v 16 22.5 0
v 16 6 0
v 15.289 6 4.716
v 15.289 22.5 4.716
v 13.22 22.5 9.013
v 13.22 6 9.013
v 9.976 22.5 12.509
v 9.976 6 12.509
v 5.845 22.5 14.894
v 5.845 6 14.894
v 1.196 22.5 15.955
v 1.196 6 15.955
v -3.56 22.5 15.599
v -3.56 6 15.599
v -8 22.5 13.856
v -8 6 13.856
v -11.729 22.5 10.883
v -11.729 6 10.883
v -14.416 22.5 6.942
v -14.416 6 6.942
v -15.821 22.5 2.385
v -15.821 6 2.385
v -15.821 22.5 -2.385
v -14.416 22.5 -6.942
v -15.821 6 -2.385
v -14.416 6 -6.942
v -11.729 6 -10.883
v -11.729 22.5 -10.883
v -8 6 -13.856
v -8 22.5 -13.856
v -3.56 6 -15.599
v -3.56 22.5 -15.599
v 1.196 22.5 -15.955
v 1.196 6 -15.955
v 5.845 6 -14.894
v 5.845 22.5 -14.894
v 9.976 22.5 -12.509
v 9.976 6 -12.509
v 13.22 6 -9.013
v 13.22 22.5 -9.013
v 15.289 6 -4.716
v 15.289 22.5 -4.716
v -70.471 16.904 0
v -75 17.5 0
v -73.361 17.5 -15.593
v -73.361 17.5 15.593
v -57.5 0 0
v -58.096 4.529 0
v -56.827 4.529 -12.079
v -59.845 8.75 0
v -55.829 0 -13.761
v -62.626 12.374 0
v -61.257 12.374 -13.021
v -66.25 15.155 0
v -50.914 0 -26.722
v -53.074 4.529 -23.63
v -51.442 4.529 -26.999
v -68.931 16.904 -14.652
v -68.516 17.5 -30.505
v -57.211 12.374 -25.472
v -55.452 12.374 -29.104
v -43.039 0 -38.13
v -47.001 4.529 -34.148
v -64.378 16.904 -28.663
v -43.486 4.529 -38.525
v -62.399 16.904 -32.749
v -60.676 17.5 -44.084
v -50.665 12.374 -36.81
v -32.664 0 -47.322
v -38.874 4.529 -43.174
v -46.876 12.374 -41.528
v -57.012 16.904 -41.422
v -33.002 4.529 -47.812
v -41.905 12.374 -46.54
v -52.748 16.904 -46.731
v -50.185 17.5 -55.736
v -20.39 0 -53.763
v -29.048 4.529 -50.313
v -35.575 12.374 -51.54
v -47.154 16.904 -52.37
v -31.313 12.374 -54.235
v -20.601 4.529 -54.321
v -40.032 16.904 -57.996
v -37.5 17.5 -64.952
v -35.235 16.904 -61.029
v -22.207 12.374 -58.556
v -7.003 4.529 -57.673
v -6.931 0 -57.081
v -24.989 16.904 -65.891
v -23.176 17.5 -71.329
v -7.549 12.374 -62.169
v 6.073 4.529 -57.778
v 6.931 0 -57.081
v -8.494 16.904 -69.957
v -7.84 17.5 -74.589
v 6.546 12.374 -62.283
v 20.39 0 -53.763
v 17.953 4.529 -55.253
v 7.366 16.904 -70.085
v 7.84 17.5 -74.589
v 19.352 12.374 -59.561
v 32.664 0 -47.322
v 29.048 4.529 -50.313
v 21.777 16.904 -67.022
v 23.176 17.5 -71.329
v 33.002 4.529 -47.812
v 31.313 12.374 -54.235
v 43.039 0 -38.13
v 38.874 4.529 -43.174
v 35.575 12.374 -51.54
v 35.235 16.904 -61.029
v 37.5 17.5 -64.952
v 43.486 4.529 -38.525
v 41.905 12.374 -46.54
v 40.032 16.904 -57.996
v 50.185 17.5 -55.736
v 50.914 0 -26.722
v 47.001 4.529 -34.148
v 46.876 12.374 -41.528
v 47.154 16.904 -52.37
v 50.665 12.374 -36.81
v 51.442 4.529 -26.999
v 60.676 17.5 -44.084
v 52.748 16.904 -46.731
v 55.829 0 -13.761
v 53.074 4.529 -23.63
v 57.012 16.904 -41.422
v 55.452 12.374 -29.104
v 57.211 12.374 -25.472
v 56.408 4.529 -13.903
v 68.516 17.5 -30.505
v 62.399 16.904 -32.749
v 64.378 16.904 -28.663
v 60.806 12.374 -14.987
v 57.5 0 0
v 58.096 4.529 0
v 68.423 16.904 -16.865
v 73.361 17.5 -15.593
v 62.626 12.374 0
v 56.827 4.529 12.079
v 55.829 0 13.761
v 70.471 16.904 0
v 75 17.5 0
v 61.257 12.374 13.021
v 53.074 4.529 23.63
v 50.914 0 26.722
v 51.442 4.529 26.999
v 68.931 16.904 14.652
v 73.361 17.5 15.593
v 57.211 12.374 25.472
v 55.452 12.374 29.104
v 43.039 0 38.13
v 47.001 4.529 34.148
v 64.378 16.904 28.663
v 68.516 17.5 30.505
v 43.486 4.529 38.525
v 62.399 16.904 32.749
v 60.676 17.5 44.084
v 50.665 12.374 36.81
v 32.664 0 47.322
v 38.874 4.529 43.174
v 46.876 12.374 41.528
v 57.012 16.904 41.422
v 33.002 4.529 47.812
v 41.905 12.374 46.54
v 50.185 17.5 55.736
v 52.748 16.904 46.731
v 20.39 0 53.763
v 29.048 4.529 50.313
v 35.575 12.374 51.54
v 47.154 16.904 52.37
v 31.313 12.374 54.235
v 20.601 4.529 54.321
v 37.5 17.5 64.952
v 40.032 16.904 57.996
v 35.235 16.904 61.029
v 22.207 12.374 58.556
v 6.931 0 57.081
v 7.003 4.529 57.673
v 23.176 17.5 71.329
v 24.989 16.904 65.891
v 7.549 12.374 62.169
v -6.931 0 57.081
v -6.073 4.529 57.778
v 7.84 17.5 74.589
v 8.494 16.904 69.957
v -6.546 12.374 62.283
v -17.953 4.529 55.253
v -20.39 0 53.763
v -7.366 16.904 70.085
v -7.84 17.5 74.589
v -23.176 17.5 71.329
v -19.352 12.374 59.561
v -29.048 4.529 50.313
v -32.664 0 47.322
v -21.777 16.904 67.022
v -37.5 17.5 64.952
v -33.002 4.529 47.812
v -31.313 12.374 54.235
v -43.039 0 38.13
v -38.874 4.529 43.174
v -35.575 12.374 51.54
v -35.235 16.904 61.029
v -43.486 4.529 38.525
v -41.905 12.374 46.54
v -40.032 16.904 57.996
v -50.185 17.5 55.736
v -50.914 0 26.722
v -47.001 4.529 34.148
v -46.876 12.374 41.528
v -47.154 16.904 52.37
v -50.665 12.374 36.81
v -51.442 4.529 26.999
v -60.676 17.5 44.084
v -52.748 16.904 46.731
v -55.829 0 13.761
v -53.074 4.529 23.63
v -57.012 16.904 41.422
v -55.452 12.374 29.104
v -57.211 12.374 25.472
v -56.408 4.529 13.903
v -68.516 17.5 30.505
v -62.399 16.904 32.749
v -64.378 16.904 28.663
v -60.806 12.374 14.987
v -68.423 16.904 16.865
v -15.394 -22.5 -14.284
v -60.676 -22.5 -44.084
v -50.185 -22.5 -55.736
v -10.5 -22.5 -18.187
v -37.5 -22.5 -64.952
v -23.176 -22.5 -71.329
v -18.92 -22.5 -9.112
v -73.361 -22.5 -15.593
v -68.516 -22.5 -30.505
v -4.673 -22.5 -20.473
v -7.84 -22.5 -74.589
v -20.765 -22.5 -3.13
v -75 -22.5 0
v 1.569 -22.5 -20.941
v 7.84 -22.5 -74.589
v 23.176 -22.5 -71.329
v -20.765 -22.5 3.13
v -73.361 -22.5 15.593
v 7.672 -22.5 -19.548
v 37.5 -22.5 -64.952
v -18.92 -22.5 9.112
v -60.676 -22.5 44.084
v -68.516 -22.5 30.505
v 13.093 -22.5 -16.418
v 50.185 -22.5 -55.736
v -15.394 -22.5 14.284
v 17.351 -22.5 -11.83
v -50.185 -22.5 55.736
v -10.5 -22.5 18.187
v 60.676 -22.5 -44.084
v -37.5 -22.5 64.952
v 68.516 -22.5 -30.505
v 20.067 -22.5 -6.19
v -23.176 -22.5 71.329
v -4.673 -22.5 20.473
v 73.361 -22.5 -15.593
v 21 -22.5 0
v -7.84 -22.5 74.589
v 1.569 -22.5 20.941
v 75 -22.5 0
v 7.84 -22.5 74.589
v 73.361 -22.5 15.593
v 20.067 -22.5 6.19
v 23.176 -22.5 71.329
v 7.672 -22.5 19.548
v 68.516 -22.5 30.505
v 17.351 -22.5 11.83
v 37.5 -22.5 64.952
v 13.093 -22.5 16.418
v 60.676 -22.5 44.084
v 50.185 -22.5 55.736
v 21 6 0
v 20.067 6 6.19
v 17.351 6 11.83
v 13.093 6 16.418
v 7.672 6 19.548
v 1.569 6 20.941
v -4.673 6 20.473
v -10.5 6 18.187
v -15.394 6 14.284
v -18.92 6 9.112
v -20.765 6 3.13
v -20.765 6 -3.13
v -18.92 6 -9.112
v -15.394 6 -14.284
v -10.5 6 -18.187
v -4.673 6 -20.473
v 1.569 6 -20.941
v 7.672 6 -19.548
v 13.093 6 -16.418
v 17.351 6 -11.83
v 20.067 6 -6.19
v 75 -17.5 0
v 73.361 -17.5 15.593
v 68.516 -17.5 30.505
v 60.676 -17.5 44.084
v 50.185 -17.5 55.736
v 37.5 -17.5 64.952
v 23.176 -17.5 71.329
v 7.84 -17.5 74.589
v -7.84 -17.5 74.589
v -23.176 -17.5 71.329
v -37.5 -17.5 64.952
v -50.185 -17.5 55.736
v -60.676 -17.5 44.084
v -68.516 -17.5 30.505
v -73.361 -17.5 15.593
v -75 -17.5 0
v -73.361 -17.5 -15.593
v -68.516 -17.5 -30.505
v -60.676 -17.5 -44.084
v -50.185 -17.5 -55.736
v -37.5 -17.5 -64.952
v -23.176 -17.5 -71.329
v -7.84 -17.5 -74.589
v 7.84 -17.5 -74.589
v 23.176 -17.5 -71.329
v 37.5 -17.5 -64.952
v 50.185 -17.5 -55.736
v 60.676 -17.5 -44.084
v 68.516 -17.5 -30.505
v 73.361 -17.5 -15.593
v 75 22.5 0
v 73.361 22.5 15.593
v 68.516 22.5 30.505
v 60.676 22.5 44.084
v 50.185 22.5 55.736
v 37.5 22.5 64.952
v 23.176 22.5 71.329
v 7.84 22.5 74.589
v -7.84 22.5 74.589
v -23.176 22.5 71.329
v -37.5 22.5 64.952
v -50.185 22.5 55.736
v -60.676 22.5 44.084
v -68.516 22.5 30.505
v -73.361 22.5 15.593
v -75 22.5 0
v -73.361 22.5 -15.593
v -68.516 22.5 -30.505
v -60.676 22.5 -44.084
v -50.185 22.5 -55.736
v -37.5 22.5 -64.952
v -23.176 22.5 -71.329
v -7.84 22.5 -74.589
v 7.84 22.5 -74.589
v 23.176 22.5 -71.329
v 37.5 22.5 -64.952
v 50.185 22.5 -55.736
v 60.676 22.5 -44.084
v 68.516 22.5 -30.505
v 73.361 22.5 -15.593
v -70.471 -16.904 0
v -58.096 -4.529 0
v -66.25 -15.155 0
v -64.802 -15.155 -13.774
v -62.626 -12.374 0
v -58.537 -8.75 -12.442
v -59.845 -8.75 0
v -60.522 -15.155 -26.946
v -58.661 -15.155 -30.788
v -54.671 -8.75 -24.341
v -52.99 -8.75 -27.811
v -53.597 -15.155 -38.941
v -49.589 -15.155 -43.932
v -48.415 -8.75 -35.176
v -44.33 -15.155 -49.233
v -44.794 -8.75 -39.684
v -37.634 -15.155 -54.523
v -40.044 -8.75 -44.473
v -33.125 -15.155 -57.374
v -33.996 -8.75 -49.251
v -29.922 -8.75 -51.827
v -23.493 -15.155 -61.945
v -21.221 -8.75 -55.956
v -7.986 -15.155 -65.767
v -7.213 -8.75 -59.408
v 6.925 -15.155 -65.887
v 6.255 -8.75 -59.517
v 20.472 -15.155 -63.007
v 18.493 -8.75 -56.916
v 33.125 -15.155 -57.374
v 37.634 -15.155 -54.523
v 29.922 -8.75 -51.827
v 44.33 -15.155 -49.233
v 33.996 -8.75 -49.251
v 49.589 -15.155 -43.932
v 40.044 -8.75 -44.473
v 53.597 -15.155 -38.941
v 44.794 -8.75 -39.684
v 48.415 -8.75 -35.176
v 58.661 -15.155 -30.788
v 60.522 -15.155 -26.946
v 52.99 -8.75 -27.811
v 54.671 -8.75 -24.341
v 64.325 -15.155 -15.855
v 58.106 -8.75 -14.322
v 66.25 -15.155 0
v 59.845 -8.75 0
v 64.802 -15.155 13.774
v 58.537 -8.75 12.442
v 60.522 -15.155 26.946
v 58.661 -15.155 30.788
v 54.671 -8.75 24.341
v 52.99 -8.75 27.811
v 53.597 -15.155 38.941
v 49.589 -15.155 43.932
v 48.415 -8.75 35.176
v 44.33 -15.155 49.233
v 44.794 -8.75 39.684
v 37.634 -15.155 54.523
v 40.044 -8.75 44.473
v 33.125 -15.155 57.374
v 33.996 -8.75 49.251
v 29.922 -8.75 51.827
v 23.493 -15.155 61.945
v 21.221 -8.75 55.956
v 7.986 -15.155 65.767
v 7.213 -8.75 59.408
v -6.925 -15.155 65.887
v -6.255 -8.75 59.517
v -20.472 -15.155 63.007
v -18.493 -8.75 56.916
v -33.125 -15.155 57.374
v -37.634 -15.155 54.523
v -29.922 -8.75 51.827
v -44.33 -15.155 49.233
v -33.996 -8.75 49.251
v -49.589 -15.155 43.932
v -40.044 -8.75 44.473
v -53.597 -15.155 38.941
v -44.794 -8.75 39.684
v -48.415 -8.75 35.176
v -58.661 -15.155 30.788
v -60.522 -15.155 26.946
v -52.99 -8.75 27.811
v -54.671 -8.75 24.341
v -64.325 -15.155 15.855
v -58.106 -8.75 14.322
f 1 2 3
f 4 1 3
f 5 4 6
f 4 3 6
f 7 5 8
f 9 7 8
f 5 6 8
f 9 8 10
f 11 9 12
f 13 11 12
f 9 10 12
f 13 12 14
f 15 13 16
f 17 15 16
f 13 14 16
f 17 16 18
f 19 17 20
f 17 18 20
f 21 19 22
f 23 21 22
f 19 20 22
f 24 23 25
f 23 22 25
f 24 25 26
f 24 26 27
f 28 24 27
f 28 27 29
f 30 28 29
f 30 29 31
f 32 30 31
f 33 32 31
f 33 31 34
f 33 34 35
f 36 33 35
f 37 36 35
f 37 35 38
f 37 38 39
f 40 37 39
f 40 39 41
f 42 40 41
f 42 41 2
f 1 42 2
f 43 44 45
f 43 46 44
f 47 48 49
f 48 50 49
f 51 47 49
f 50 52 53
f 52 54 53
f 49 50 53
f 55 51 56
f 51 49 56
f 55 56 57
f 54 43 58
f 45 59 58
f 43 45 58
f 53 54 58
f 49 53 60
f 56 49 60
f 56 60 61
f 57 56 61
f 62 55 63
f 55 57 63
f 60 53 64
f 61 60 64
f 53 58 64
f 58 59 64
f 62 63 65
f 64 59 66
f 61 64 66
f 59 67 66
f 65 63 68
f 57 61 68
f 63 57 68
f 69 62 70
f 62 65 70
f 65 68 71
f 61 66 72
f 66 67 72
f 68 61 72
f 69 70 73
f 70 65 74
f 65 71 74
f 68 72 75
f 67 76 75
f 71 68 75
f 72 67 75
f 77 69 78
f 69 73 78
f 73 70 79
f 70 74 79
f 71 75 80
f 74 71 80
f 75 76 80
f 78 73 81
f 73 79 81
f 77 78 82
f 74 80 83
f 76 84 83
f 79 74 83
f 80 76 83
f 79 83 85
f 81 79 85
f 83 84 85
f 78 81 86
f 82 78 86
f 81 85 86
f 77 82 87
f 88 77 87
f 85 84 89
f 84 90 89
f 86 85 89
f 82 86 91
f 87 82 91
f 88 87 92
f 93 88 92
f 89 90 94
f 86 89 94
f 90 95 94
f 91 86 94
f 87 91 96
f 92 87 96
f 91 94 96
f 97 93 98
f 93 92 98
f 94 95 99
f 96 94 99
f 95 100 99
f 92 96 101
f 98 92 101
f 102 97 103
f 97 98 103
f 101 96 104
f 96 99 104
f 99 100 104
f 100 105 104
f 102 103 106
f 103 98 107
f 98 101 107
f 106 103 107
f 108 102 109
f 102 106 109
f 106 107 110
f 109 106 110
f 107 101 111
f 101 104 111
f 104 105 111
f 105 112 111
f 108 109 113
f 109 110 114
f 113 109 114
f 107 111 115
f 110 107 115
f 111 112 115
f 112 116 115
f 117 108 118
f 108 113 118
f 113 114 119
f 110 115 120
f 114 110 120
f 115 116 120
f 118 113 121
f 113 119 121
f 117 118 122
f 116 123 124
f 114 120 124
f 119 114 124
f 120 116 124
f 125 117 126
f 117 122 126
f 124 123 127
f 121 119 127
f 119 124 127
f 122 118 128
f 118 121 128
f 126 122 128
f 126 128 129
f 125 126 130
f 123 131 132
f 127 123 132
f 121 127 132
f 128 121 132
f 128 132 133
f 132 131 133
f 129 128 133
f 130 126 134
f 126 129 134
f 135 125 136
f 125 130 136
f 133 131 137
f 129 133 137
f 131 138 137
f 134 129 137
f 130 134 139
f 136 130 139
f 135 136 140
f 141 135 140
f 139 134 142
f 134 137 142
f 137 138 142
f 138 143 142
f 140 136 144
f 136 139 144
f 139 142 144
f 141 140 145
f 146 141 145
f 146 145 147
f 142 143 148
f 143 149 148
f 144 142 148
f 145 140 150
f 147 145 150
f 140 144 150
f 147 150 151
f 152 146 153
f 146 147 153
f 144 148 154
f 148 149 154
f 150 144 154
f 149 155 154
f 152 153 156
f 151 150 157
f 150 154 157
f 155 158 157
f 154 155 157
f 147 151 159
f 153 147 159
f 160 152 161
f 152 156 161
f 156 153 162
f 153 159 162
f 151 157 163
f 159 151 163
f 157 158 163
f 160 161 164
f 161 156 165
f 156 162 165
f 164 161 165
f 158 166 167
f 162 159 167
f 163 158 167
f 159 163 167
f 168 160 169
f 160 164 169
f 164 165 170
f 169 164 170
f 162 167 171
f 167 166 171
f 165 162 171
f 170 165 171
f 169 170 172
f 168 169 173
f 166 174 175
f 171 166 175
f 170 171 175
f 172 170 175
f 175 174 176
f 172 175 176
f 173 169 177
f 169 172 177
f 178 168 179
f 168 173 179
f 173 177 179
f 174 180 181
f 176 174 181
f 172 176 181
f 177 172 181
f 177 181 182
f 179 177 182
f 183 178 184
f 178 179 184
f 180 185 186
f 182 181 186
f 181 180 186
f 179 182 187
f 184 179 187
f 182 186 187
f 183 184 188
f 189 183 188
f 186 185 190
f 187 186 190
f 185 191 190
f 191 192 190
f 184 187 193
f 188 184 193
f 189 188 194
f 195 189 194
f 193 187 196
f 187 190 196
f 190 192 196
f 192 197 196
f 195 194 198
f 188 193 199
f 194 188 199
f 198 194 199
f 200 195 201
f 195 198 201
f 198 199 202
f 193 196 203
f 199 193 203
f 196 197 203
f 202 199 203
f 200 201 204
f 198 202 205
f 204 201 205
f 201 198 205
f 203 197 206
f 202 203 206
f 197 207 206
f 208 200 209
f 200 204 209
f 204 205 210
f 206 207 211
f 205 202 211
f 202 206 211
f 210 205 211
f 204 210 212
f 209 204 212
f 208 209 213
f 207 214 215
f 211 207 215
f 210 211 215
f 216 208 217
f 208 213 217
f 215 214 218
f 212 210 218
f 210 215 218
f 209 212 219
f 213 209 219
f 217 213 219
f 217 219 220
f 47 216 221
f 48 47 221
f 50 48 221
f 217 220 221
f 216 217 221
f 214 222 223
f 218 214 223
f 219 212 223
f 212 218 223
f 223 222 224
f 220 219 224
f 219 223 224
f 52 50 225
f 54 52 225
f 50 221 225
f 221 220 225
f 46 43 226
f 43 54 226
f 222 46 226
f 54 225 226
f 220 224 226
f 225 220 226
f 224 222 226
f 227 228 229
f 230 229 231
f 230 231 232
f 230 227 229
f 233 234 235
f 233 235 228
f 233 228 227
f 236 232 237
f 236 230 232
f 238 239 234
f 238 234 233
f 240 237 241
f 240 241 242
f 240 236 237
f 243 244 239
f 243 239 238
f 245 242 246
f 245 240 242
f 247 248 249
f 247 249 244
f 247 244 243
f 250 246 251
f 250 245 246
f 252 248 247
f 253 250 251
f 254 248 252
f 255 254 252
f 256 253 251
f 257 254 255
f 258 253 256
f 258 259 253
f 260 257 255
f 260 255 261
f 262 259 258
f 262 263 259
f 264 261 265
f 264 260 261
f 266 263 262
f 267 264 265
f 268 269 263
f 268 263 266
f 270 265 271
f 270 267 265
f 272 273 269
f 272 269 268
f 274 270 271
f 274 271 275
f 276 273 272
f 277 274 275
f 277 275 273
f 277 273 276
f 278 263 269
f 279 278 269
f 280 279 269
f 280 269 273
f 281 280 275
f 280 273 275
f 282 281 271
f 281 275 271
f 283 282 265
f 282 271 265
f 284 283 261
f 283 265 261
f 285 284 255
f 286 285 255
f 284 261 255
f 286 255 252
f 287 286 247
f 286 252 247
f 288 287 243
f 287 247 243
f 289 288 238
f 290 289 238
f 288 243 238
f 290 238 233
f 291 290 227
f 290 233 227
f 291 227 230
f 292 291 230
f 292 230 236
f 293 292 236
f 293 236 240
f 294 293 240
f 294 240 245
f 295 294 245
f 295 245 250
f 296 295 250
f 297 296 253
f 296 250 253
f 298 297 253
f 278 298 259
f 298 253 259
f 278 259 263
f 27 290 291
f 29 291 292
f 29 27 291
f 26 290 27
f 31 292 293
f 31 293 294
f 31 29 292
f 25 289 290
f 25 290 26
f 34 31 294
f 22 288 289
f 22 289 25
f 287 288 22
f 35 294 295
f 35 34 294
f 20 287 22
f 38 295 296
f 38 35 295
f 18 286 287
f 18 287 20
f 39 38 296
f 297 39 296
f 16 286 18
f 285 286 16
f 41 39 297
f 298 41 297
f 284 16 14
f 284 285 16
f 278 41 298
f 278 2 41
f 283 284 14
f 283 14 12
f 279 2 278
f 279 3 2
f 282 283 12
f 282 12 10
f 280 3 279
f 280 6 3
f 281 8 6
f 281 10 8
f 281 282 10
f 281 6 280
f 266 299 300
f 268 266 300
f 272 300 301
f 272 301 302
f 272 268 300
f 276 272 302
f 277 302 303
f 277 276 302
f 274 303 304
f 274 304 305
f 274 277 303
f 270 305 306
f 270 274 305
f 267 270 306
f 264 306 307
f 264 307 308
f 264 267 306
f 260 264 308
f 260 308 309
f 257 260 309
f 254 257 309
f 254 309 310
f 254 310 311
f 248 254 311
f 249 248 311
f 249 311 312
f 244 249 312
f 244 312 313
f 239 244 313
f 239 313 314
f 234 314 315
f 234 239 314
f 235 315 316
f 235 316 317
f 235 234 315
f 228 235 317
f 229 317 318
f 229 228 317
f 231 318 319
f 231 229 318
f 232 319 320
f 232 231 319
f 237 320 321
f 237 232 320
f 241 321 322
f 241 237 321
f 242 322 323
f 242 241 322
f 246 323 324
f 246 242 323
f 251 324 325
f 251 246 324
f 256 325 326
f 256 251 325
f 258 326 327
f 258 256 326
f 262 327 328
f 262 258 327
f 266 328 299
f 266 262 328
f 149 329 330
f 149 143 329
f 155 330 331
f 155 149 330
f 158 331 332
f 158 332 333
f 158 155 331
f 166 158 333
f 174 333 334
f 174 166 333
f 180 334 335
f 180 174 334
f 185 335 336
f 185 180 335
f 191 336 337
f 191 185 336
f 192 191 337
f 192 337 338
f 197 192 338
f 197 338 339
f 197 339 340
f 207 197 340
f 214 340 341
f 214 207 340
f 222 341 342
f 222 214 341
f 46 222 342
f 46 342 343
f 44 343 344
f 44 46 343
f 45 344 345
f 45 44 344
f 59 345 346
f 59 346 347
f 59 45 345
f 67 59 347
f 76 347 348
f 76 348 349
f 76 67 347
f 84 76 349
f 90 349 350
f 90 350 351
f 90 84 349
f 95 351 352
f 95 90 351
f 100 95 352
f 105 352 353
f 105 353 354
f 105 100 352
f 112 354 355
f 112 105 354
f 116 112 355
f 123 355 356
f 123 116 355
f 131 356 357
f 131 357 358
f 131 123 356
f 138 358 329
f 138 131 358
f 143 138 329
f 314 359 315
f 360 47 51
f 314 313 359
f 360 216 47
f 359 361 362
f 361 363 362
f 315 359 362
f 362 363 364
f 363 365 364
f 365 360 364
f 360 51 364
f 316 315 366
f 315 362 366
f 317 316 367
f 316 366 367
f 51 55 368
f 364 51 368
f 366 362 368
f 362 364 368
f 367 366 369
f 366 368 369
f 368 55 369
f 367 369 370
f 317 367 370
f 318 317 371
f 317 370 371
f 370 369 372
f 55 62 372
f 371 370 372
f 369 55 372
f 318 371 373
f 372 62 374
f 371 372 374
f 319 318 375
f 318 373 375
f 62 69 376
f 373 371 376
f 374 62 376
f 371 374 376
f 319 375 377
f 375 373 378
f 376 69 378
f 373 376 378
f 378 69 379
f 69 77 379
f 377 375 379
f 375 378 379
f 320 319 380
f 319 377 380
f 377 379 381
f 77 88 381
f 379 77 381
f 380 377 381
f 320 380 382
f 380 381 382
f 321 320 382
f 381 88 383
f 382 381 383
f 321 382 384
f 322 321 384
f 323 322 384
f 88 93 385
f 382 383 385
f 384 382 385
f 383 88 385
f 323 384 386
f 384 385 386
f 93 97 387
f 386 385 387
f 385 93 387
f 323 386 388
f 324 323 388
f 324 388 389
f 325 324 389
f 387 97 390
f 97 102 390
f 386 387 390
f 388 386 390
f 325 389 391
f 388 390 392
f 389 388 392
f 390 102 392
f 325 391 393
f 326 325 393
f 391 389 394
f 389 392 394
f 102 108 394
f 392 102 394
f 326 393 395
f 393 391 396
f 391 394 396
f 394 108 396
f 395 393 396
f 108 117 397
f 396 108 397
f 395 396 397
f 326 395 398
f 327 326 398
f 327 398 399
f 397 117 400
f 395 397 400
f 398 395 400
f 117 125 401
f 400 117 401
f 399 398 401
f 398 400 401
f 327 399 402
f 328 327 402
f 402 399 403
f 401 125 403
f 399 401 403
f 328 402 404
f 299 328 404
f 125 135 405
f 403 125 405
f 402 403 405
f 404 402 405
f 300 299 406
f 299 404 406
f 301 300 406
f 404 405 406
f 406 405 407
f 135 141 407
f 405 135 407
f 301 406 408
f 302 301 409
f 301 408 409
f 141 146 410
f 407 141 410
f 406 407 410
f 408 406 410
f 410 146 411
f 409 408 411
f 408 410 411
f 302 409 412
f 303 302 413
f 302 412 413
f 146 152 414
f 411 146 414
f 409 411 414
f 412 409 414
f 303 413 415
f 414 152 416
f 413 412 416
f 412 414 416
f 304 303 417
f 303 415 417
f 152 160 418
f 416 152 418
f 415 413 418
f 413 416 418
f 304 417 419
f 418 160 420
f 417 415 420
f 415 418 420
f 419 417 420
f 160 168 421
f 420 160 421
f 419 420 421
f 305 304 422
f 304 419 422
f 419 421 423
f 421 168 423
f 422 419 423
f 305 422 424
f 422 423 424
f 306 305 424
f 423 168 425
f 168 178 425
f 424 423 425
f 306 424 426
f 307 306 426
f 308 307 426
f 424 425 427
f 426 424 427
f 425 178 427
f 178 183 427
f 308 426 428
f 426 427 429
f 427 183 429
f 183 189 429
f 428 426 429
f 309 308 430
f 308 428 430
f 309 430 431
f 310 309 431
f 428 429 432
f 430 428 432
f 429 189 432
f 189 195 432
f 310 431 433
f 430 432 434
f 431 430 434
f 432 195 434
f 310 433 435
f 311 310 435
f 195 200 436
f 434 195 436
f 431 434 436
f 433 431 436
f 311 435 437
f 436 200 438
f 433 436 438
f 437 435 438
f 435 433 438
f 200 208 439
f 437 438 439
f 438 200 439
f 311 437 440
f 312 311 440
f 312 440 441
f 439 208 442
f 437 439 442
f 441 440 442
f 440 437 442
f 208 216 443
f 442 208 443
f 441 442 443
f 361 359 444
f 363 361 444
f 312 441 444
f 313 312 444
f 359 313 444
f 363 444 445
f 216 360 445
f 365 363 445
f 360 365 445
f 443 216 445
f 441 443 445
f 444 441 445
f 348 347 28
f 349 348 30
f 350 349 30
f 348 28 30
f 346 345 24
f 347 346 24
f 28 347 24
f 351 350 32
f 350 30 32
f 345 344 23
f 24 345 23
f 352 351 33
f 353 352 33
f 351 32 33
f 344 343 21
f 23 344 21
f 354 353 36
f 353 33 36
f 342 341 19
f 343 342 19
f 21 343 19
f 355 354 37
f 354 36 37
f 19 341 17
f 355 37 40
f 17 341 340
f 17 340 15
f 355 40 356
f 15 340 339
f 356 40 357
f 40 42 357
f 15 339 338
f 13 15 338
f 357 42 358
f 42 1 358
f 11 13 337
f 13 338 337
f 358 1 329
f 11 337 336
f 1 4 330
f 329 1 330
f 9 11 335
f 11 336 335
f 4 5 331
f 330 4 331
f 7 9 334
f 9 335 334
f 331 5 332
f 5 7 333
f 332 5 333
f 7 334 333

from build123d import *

# Parameters (mm, degrees)
F0_R       = 75
F1_DEPTH   = 22.5
F2_R       = 17.5
F5_R       = 21
F6_DEPTH   = 28.5
F7_R       = 16
F1_FACE1_R = 75
F8_DEPTH   = 45.001


with BuildPart() as f1:
    # F0 (on Front) → F1 (new body, symmetric)
    with BuildSketch(Plane.XZ):
        Circle(F0_R)
    extrude(amount=F1_DEPTH, both=True)

    # F2 (on Top) → F4 (revolve, cut)
    with BuildSketch(Plane.XY):
        with Locations((-75, 0)):
            Circle(F2_R)
    revolve(axis=Axis((0, 4.404310137, 0), (0, -1, 0)), mode=Mode.SUBTRACT)

    # F5 (on face) → F6 (cut)
    with BuildSketch(Plane.XZ.offset(22.5)):
        Circle(F5_R)
    extrude(amount=-F6_DEPTH, mode=Mode.SUBTRACT)

    # F7 (on face) + F1_face1 (on face) → F8 (cut, through all)
    with BuildSketch(Plane.XZ.offset(22.5)):
        Circle(F7_R)
    with BuildSketch(Plane(origin=(0, 22.5, 0), x_dir=(1, 0, 0), z_dir=(0, 1, 0))):
        Circle(F1_FACE1_R)
    extrude(amount=-F8_DEPTH, dir=(0, -1, 0), mode=Mode.SUBTRACT)


solid = f1.part
